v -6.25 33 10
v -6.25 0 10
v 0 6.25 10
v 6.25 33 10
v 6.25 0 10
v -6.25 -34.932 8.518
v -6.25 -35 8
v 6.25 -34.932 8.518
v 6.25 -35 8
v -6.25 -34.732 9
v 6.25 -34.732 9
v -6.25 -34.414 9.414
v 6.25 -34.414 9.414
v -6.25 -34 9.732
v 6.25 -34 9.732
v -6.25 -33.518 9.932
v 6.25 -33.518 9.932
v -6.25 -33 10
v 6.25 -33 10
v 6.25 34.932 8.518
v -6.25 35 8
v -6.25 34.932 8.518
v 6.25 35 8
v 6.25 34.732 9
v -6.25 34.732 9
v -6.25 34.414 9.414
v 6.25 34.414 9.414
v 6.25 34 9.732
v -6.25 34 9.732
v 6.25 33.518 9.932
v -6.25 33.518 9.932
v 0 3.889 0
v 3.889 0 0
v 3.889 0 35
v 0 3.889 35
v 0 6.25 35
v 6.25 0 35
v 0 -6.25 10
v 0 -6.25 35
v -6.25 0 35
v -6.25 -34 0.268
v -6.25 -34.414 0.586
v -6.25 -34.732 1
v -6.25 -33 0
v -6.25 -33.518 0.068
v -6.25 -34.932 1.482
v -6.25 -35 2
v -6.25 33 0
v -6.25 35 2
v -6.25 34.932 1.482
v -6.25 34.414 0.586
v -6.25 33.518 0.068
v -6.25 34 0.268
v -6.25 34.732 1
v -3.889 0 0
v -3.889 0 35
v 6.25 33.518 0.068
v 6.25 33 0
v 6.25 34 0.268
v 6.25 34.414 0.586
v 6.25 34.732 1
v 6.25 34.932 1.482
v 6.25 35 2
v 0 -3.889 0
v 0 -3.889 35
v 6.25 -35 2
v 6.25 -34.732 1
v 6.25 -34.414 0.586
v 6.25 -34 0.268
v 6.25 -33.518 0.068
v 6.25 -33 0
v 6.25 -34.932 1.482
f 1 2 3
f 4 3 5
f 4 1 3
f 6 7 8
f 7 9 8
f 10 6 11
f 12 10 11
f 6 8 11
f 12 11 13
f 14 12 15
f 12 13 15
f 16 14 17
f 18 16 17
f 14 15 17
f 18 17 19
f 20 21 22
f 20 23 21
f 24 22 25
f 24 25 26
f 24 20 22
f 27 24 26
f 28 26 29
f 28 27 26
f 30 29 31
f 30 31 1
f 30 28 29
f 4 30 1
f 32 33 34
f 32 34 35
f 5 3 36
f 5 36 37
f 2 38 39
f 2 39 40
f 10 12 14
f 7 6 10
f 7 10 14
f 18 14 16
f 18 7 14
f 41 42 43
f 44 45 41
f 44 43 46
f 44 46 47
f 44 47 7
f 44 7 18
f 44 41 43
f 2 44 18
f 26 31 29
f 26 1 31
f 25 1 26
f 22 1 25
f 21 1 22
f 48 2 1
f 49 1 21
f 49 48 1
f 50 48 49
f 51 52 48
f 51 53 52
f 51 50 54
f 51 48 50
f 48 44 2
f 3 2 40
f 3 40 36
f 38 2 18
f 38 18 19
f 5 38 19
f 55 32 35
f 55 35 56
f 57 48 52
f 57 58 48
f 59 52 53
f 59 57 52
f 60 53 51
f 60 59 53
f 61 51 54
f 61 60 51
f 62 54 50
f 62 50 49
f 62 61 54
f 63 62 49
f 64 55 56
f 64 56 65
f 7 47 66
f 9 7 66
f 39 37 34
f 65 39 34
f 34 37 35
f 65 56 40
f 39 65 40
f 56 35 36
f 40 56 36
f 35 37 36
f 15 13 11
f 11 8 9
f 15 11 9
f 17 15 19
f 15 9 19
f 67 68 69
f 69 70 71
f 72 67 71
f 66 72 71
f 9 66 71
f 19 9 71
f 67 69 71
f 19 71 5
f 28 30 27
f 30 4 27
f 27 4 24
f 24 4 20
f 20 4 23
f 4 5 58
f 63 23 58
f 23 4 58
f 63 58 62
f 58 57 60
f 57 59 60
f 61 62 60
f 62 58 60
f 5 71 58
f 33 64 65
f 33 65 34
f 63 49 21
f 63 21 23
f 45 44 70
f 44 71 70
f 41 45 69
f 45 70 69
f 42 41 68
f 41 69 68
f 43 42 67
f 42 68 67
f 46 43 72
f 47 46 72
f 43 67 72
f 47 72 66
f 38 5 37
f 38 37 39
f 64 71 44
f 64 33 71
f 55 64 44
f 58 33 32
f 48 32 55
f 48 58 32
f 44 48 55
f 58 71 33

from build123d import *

# Parameters (mm, degrees)
ESQUISSE1_W             = 12.5
ESQUISSE1_H             = 70
BOSS_EXTRU_1_DEPTH      = 10
BOSS_EXTRU_2_DEPTH      = 35
ENL_V_MAT_EXTRU_1_DEPTH = 40
CONG_3_R                = 2


with BuildPart() as part:
    # Esquisse1 → Boss.-Extru.1 (new body)
    with BuildSketch(Plane.XY):
        Rectangle(ESQUISSE1_W, ESQUISSE1_H)
    extrude(amount=BOSS_EXTRU_1_DEPTH)

    # Esquisse2 → Boss.-Extru.2 (add)
    with BuildSketch(Plane(origin=(0, 0, 0), x_dir=(-1, 0, 0), z_dir=(0, 0, -1))):
        Polygon((6.25, 0), (0, 6.25), (-6.25, 0), (0, -6.25), align=None)
    extrude(amount=-BOSS_EXTRU_2_DEPTH)

    # Esquisse3 → Enlèv. mat.-Extru.1 (cut)
    with BuildSketch(Plane(origin=(0, 0, 0), x_dir=(-1, 0, 0), z_dir=(0, 0, -1))):
        Polygon((-3.889087297, 0), (0, 3.889087297), (3.889087297, 0), (0, -3.889087297), align=None)
    extrude(amount=-ENL_V_MAT_EXTRU_1_DEPTH, mode=Mode.SUBTRACT)

    # Congé3
    cong_3_edges = [part.edges().sort_by_distance(p)[0] for p in [
        (0, -35, 10),
        (0, -35, 0),
        (0, 35, 0),
        (0, 35, 10),
    ]]
    fillet(cong_3_edges, radius=CONG_3_R)


solid = part.part
